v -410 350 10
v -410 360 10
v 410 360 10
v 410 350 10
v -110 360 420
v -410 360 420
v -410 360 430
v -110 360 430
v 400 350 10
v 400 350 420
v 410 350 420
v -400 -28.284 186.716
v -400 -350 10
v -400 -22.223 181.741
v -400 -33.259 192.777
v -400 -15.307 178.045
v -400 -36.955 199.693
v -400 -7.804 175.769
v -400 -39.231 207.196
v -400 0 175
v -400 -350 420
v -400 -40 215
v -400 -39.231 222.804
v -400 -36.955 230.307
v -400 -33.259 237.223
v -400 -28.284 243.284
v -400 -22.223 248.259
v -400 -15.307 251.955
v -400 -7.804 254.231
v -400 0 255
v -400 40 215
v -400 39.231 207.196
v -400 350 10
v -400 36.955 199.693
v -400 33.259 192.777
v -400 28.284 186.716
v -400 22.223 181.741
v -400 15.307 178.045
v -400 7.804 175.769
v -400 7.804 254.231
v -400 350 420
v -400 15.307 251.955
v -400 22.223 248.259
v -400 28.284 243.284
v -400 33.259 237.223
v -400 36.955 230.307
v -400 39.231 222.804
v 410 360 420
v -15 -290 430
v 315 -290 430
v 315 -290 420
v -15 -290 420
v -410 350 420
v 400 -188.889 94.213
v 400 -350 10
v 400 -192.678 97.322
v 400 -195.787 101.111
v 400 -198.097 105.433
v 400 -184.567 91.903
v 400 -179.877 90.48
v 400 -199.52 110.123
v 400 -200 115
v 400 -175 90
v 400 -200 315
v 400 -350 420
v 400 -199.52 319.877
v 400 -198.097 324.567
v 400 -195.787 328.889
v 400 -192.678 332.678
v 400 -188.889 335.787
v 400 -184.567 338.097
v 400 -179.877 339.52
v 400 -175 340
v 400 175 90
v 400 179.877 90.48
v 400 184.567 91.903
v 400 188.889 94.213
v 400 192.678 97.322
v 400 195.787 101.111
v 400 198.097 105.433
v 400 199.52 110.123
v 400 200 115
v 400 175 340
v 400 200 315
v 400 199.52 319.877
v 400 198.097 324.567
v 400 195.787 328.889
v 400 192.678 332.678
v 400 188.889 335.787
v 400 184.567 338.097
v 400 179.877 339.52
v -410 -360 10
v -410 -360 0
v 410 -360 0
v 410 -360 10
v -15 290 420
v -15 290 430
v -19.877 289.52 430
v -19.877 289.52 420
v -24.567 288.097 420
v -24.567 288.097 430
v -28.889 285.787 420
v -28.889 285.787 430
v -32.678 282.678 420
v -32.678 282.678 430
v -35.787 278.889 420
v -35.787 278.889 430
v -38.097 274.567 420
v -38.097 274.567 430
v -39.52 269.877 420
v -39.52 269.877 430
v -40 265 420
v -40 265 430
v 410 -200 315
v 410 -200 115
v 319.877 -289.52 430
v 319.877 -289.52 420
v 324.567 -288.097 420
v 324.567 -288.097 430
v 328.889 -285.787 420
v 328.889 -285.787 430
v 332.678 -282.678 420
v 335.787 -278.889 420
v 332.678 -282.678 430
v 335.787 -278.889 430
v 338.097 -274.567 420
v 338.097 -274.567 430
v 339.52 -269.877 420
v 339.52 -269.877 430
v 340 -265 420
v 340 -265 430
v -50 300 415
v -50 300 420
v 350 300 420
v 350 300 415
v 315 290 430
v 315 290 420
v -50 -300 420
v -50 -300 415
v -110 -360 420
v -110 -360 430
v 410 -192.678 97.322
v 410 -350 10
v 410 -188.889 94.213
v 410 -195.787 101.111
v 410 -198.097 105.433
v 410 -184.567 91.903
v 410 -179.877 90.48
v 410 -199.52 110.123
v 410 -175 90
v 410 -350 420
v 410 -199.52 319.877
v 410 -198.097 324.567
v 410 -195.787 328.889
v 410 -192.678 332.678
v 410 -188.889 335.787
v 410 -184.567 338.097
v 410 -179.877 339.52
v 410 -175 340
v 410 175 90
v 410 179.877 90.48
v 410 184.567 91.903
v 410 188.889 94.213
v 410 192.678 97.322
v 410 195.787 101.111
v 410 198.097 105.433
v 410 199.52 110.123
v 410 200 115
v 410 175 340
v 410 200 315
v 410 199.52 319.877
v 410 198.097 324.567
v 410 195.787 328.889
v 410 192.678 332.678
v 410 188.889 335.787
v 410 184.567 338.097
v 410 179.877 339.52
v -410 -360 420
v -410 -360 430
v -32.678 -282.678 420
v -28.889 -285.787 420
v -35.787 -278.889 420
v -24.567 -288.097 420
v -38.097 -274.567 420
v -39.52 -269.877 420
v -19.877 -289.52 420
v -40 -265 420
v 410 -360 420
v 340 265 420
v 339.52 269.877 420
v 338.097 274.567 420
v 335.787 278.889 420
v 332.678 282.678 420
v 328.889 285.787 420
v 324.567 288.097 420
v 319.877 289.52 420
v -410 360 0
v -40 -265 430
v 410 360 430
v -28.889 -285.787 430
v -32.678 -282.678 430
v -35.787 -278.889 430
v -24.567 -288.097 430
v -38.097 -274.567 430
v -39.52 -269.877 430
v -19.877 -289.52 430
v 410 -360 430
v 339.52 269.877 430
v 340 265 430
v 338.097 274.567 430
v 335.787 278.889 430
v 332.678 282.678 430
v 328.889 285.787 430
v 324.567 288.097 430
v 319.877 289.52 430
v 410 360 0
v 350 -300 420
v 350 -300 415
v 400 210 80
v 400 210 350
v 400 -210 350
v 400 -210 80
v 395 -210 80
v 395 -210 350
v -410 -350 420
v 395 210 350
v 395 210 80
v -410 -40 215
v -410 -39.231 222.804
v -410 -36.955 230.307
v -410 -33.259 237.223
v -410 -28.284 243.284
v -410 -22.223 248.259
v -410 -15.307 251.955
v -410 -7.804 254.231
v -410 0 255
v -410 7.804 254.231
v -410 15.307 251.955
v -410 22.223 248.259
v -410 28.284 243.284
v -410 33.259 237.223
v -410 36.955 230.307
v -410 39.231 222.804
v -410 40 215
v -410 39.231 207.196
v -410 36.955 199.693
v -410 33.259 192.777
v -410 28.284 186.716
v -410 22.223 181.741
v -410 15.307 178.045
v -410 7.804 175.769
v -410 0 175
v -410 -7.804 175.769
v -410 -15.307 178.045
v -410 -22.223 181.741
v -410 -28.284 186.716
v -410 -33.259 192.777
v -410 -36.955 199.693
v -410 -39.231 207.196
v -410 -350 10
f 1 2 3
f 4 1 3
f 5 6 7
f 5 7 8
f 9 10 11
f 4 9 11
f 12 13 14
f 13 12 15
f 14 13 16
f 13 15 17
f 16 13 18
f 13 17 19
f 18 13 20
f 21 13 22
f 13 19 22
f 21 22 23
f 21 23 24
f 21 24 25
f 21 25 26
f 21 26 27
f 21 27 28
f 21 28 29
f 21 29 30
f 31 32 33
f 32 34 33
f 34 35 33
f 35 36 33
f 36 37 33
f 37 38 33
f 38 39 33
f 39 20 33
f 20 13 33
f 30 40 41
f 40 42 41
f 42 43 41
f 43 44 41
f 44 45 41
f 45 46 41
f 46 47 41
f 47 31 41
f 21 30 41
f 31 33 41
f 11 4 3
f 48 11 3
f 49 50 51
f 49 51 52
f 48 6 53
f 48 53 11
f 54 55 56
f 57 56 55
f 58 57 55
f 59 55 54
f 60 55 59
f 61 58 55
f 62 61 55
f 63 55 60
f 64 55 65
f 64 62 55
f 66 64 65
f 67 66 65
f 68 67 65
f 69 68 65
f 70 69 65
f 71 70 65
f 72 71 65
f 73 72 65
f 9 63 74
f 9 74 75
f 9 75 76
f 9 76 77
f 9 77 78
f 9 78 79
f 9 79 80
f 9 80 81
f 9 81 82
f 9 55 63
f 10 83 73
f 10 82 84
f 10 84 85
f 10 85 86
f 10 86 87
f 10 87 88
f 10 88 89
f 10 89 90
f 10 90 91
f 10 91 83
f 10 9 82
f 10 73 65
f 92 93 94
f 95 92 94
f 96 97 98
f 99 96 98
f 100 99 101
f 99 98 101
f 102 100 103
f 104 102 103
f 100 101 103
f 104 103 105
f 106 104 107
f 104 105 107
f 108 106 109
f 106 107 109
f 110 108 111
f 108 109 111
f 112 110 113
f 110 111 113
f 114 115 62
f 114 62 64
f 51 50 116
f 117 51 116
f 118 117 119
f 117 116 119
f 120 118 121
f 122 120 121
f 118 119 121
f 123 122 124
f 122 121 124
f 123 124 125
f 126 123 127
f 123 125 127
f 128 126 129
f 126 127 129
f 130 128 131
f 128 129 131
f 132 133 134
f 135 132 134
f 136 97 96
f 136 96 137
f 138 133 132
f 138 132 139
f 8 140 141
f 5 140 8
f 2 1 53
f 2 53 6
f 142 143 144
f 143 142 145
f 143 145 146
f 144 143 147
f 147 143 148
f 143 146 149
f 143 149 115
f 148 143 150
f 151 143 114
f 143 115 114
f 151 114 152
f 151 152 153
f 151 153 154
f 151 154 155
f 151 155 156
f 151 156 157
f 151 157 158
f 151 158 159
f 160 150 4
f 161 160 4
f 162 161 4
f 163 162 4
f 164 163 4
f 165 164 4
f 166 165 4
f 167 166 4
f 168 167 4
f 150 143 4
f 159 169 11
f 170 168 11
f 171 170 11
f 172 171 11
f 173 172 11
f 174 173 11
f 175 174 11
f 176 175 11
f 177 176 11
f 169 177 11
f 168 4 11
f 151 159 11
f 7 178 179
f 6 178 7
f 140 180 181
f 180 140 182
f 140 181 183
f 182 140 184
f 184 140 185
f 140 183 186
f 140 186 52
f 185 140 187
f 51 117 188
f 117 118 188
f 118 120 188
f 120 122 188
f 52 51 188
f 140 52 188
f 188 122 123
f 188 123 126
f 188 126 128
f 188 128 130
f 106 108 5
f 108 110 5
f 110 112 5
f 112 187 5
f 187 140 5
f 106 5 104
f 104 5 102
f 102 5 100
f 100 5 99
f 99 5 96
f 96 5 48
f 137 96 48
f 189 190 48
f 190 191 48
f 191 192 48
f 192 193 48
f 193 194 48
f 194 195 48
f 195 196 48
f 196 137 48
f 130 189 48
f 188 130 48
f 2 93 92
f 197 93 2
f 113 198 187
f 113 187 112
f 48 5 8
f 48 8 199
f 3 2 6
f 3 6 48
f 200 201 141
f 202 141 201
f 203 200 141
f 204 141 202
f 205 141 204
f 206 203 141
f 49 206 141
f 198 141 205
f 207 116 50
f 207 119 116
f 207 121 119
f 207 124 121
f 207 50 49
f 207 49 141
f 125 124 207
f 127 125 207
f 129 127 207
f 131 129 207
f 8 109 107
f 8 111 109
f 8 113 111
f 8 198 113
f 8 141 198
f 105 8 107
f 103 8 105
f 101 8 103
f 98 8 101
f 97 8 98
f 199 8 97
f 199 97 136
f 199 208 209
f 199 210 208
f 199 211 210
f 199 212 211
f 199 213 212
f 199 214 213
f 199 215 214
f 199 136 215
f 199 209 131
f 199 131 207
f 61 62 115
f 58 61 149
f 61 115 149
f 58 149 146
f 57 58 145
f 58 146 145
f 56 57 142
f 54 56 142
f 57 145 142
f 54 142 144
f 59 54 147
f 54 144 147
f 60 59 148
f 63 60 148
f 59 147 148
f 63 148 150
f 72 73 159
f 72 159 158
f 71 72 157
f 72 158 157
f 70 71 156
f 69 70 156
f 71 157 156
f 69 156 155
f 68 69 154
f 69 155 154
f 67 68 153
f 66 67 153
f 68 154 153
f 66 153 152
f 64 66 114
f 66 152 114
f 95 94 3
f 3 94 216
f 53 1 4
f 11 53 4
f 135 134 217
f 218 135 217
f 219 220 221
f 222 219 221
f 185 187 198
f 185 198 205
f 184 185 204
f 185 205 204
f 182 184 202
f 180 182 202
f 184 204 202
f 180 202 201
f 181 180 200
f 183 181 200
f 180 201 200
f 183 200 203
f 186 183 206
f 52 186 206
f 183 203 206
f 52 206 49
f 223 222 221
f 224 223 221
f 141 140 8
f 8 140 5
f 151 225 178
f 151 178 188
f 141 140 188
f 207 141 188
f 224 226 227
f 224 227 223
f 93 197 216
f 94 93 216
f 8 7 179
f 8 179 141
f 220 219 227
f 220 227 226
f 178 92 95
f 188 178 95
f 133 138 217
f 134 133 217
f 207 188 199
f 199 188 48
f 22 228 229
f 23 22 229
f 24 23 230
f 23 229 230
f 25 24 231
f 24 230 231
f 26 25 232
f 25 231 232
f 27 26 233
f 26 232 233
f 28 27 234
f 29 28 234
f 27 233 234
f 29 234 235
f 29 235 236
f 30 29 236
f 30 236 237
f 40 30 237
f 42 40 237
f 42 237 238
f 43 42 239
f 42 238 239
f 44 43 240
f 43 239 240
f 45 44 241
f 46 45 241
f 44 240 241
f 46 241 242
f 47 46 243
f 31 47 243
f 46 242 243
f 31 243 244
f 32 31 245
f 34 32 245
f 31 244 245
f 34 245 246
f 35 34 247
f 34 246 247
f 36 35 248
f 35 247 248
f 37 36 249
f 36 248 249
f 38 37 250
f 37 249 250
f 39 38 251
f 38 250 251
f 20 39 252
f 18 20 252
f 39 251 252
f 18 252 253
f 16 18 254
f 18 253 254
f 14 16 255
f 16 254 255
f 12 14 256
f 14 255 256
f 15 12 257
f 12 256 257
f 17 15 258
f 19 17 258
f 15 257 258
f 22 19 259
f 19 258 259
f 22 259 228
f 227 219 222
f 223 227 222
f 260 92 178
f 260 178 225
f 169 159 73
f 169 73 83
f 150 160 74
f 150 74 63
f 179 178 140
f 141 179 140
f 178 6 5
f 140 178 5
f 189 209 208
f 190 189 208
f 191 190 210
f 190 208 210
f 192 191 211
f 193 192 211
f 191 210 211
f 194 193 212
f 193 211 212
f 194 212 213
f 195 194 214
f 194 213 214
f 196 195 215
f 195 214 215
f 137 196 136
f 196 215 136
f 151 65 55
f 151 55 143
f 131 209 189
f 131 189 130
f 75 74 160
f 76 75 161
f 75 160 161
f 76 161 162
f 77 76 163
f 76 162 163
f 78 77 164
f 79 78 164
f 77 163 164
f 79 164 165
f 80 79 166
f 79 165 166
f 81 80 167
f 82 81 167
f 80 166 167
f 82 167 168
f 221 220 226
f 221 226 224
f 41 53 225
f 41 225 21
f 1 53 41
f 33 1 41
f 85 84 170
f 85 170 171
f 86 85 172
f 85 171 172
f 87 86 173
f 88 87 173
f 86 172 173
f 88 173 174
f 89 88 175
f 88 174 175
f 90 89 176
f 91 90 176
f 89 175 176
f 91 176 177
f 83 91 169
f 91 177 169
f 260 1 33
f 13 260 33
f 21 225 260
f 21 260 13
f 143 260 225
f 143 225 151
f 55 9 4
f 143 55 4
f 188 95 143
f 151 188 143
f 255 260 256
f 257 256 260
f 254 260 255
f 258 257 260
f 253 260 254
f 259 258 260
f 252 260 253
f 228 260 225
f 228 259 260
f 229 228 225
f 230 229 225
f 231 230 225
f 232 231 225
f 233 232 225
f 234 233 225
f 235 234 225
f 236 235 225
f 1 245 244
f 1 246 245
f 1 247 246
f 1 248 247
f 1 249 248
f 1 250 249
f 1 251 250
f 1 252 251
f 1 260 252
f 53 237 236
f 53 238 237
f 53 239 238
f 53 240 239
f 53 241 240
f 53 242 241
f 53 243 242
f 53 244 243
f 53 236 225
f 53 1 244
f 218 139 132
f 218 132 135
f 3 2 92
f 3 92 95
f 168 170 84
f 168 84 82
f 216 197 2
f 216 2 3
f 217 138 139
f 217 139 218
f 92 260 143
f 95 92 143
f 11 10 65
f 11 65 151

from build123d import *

# Parameters (mm, degrees)
SKETCH_W        = 820
SKETCH_H        = 720
PAD_DEPTH       = 10
SKETCH001_W     = 820
SKETCH001_H     = 10
PAD001_DEPTH    = 410
SKETCH002_W     = 820
SKETCH002_H     = 10
PAD002_DEPTH    = 410
SKETCH003_W     = 300
SKETCH003_H     = 720
PAD003_DEPTH    = 10
SKETCH004_W     = 520
SKETCH004_H     = 720
PAD004_DEPTH    = 10
POCKET_DEPTH    = 10
SKETCH005_W     = 10
SKETCH005_H     = 410
PAD005_DEPTH    = 700
POCKET001_DEPTH = 10
SKETCH006_W     = 10
SKETCH006_H     = 410
PAD006_DEPTH    = 700
SKETCH012_R     = 40
POCKET002_DEPTH = 10
SKETCH009_W     = 400
SKETCH009_H     = 600
PAD007_DEPTH    = 5
SKETCH010_W     = 420
SKETCH010_H     = 270
PAD008_DEPTH    = 5


with BuildPart() as bottom:
    # Sketch → Pad (new body)
    with BuildSketch(Plane.XY):
        Rectangle(SKETCH_W, SKETCH_H)
    extrude(amount=PAD_DEPTH)


with BuildPart() as right_side:
    # Sketch001 (on Face1 of CopyPad) → Pad001 (new body)
    with BuildSketch(Plane.XY.offset(10)):
        with Locations((0, 355)):
            Rectangle(SKETCH001_W, SKETCH001_H)
    extrude(amount=PAD001_DEPTH)


with BuildPart() as left_side:
    # Sketch002 (on Face1 of CopyPad001) → Pad002 (new body)
    with BuildSketch(Plane.XY.offset(10)):
        with Locations((0, -355)):
            Rectangle(SKETCH002_W, SKETCH002_H)
    extrude(amount=PAD002_DEPTH)


with BuildPart() as fixed_top_part:
    # Sketch003 (on Face1 of CopyPad002) → Pad003 (new body)
    with BuildSketch(Plane.XY.offset(420)):
        with Locations((-260, 0)):
            Rectangle(SKETCH003_W, SKETCH003_H)
    extrude(amount=PAD003_DEPTH)


with BuildPart() as top_door:
    # Sketch004 (on Face1 of CopyPad002001) → Pad004 (new body)
    with BuildSketch(Plane.XY.offset(420)):
        with Locations((150, 0)):
            Rectangle(SKETCH004_W, SKETCH004_H)
    extrude(amount=PAD004_DEPTH)

    # Sketch007 (on Face6 of Pad004) → Pocket (cut)
    with BuildSketch(Plane.XY.offset(430)):
        with BuildLine():
            Line((-15, 290), (315, 290))
            ThreePointArc((340, 265), (332.67767, 282.67767), (315, 290))
            Line((340, 265), (340, -265))
            ThreePointArc((315, -290), (332.67767, -282.67767), (340, -265))
            Line((315, -290), (-15, -290))
            ThreePointArc((-40, -265), (-32.67767, -282.67767), (-15, -290))
            Line((-40, -265), (-40, 265))
            ThreePointArc((-15, 290), (-32.67767, 282.67767), (-40, 265))
        make_face()
    extrude(amount=-POCKET_DEPTH, mode=Mode.SUBTRACT)


with BuildPart() as front_door:
    # Sketch005 (on Face1 of CopyPad001001) → Pad005 (new body)
    with BuildSketch(Plane(origin=(0, 350, 10), x_dir=(1, 0, 0), z_dir=(0, -1, 0))):
        with Locations((405, 205)):
            Rectangle(SKETCH005_W, SKETCH005_H)
    extrude(amount=PAD005_DEPTH)

    # Sketch008 (on Face4 of Pad005) → Pocket001 (cut)
    with BuildSketch(Plane(origin=(410, 0, 10), x_dir=(0, 1, 0), z_dir=(1, 0, 0))):
        with BuildLine():
            Line((-175, 330), (175, 330))
            ThreePointArc((200, 305), (192.67767, 322.67767), (175, 330))
            Line((200, 305), (200, 105))
            ThreePointArc((175, 80), (192.67767, 87.32233), (200, 105))
            Line((175, 80), (-175, 80))
            ThreePointArc((-200, 105), (-192.67767, 87.32233), (-175, 80))
            Line((-200, 105), (-200, 305))
            ThreePointArc((-175, 330), (-192.67767, 322.67767), (-200, 305))
        make_face()
    extrude(amount=-POCKET001_DEPTH, mode=Mode.SUBTRACT)


with BuildPart() as back_side:
    # Sketch006 (on Face1 of CopyPad001002) → Pad006 (new body)
    with BuildSketch(Plane(origin=(0, 350, 10), x_dir=(1, 0, 0), z_dir=(0, -1, 0))):
        with Locations((-405, 205)):
            Rectangle(SKETCH006_W, SKETCH006_H)
    extrude(amount=PAD006_DEPTH)

    # Sketch012 (on Face4 of Pad006) → Pocket002 (cut)
    with BuildSketch(Plane(origin=(-410, 0, 10), x_dir=(0, -1, 0), z_dir=(-1, 0, 0))):
        with Locations((0, 205)):
            Circle(SKETCH012_R)
    extrude(amount=-POCKET002_DEPTH, mode=Mode.SUBTRACT)


with BuildPart() as top_glass:
    # Sketch009 (on Face1 of CopyPocket) → Pad007 (new body)
    with BuildSketch(Plane(origin=(0, 0, 420), x_dir=(1, 0, 0), z_dir=(0, 0, -1))):
        with Locations((150, 0)):
            Rectangle(SKETCH009_W, SKETCH009_H)
    extrude(amount=PAD007_DEPTH)


with BuildPart() as front_glass:
    # Sketch010 (on Face1 of CopyPocket001) → Pad008 (new body)
    with BuildSketch(Plane(origin=(400, 0, 10), x_dir=(0, -1, 0), z_dir=(-1, 0, 0))):
        with Locations((0, 205)):
            Rectangle(SKETCH010_W, SKETCH010_H)
    extrude(amount=PAD008_DEPTH)


solid = Compound([bottom.part, right_side.part, left_side.part, fixed_top_part.part, top_door.part, front_door.part, back_side.part, top_glass.part, front_glass.part])
